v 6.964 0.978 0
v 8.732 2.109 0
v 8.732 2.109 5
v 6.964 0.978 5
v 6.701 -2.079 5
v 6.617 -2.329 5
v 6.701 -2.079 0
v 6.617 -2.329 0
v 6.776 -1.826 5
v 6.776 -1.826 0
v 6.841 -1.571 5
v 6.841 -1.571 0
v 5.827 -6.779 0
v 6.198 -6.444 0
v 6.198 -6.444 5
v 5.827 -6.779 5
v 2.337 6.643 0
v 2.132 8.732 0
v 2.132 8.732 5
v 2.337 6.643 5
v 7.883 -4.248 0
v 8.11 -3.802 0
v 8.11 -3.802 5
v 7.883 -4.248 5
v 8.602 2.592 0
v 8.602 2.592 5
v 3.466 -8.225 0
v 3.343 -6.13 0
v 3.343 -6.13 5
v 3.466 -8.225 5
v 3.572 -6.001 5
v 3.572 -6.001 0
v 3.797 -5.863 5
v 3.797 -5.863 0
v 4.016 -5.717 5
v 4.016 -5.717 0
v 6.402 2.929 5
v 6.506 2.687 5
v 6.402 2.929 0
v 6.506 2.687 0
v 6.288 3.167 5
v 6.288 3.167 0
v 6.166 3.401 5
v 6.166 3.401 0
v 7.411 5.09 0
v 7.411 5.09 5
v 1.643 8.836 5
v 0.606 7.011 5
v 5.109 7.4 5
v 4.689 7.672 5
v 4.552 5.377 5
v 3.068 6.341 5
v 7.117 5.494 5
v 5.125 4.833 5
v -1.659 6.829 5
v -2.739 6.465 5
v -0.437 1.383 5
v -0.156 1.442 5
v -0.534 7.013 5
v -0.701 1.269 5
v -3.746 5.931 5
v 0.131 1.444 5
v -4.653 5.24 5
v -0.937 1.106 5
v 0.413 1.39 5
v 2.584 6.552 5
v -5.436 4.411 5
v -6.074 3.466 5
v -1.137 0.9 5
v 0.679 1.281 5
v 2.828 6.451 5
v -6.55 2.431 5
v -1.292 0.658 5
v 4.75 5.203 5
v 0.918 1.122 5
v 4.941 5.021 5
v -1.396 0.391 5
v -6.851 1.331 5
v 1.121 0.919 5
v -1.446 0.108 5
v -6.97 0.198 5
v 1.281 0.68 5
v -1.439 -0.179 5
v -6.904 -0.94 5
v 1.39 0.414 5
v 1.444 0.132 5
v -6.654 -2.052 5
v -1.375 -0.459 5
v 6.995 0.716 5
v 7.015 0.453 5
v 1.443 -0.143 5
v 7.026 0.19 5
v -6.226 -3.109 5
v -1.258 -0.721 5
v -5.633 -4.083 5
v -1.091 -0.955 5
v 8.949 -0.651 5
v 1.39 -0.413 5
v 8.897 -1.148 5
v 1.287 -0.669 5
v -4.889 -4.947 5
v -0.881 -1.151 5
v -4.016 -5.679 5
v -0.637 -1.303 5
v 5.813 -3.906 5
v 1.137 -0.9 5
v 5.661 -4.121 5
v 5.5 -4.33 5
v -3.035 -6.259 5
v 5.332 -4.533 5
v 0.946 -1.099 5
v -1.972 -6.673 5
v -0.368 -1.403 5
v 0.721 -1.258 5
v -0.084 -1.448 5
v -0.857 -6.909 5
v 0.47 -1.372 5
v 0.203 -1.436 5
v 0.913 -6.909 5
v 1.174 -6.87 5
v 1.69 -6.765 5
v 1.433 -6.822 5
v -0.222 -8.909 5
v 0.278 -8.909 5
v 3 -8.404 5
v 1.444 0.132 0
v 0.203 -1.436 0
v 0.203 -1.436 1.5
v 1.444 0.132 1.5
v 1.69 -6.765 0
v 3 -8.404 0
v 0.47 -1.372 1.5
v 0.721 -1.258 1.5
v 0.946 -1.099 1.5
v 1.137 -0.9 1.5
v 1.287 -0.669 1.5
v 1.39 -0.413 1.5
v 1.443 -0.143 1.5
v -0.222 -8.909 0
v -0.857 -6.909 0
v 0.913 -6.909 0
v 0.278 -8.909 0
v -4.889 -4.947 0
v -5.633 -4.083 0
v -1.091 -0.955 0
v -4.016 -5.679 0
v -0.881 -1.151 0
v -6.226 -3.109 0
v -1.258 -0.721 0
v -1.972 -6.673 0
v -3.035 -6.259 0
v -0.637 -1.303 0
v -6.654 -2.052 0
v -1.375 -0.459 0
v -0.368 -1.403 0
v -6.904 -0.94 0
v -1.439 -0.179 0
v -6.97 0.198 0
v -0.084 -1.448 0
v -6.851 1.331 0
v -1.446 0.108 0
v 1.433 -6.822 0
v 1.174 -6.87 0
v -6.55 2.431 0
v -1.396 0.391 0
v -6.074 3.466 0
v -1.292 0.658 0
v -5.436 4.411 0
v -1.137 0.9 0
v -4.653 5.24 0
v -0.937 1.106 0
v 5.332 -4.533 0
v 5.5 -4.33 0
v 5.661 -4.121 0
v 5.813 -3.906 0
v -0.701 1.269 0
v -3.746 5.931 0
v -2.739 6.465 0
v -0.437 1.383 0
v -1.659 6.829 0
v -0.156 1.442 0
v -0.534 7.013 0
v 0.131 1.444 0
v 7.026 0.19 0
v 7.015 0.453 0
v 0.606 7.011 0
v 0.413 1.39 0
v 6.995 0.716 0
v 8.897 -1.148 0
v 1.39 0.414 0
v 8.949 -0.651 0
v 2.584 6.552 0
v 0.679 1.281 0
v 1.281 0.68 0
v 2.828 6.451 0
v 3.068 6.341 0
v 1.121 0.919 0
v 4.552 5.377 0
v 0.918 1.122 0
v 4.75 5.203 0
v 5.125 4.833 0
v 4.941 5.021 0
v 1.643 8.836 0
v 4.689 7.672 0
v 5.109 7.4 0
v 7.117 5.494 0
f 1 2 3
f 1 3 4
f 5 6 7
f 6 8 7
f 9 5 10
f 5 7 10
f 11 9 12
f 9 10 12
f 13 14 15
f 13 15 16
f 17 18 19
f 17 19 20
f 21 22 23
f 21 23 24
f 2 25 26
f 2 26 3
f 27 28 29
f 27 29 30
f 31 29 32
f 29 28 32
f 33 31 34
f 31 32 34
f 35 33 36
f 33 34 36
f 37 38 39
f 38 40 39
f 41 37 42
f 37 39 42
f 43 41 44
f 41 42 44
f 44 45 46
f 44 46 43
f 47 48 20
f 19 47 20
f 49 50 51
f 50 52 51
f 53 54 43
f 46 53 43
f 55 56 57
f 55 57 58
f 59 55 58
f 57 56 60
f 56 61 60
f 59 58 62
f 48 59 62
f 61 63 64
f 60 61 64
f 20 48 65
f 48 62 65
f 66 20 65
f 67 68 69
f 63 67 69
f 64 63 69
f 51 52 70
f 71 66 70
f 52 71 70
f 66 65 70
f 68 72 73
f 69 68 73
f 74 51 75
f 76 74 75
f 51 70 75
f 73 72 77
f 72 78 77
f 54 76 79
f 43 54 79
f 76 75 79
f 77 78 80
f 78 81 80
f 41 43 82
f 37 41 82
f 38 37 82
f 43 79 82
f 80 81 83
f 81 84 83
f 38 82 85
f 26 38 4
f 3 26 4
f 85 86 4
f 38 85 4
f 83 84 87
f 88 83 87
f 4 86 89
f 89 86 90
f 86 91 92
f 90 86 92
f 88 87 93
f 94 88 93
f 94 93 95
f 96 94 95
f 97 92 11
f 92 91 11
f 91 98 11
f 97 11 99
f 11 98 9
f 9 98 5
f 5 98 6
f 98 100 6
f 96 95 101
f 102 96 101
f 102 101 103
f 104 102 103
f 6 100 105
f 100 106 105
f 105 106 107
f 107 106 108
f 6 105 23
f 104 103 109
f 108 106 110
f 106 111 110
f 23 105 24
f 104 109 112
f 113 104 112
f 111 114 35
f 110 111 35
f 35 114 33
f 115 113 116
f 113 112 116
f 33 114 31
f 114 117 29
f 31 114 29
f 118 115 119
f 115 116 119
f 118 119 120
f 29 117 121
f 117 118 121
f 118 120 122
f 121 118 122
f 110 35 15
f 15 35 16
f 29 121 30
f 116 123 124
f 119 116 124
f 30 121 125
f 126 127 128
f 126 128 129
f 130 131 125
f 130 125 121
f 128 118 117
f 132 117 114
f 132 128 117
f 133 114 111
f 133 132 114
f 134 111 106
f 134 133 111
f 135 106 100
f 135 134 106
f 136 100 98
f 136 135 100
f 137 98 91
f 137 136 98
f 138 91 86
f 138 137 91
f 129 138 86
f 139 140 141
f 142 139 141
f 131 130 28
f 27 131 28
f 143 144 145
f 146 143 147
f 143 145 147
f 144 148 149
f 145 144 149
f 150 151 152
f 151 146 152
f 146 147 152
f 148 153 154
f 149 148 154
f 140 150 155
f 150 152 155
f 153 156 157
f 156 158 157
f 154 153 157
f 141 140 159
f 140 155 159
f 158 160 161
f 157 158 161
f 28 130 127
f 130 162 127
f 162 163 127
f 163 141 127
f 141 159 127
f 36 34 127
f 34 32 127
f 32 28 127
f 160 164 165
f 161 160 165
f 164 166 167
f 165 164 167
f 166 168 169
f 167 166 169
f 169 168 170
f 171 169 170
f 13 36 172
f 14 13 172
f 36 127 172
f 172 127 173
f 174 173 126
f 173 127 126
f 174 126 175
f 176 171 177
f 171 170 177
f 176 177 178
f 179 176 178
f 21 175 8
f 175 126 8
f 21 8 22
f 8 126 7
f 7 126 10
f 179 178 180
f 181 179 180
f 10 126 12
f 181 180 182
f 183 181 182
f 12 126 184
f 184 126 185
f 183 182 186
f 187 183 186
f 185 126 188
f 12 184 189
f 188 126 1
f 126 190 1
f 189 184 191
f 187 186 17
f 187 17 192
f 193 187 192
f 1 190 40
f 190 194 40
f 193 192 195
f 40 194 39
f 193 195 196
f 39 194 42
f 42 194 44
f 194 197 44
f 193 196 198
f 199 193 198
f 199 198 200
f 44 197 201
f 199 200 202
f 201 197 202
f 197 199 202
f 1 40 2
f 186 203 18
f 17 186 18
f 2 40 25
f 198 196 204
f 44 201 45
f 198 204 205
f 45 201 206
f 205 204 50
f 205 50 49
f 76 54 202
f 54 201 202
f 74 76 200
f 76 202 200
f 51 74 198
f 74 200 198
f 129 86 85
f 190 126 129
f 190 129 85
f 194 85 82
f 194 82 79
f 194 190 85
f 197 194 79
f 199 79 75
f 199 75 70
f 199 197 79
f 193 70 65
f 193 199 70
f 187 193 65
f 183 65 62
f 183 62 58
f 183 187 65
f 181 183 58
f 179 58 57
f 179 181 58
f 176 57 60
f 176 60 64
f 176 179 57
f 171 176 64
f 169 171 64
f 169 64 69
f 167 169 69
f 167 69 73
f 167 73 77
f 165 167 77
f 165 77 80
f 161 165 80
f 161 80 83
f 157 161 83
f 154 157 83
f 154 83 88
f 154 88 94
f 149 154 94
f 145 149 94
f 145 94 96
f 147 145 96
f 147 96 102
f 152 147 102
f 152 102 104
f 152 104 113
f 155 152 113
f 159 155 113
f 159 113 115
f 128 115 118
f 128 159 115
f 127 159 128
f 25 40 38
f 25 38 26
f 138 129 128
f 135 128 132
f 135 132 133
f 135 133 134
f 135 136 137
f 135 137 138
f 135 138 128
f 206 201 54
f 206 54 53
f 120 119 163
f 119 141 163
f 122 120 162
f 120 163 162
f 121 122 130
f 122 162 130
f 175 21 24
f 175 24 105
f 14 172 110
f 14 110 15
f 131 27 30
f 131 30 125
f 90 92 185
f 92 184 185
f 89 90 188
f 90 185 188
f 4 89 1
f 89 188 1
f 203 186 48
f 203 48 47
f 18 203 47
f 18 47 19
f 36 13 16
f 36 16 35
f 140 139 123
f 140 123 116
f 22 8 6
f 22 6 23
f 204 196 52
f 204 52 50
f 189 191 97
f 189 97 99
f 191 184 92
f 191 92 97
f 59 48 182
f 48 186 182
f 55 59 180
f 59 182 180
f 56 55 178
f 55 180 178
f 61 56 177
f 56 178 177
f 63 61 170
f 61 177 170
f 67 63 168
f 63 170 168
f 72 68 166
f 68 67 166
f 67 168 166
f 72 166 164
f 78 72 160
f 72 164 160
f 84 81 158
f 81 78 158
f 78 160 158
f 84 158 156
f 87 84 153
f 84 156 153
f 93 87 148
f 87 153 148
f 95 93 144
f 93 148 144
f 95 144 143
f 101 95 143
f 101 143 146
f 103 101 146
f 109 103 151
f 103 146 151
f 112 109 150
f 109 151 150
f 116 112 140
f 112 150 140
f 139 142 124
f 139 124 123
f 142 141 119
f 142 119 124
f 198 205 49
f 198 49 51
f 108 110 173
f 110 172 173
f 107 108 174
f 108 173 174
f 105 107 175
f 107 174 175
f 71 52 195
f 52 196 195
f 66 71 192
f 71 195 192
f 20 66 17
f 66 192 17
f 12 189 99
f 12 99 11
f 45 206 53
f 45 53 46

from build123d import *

# Parameters (mm, degrees)
SKETCH1_R           = 7
BOSS_EXTRUDE1_DEPTH = 5
BOSS_EXTRUDE2_DEPTH = 5
CIRPATTERN3_COUNT   = 9
CIRPATTERN3_ANGLE   = 168
CUT_EXTRUDE1_START  = -3.5
SKETCH5_R           = 1.45
CUT_EXTRUDE1_DEPTH  = 3.5


with BuildPart() as part:
    # Sketch1 → Boss-Extrude1 (new body)
    with BuildSketch(Plane.XY):
        with Locations((0.027853283, 0.035186328)):
            Circle(SKETCH1_R)
        with BuildLine():
            Line((0.20260938, -1.435774857), (1.443945142, 0.132372307))
            ThreePointArc((1.443945142, 0.132372307), (-1.136906694, 0.899968427), (0.20260938, -1.435774857))
        make_face(mode=Mode.SUBTRACT)
    extrude(amount=BOSS_EXTRUDE1_DEPTH)

    # Sketch3 → Boss-Extrude2 (add)
    with BuildSketch(Plane(origin=(0, 0, 0), x_dir=(-1, 0, 0), z_dir=(0, 0, -1))):
        Polygon((0.857146717, -6.908643667), (-0.912853283, -6.908643667), (-0.277853283, -8.908643667), (0.222146717, -8.908643667), align=None)
    boss_extrude2 = extrude(amount=-BOSS_EXTRUDE2_DEPTH)

    # CirPattern3: Boss-Extrude2 ×9 about axis
    cirpattern3_axis = Axis((0.027853283, 0.035186328, 0), (0, 0, 1))
    for i in range(1, CIRPATTERN3_COUNT):
        add(boss_extrude2.rotate(cirpattern3_axis, i * CIRPATTERN3_ANGLE / (CIRPATTERN3_COUNT - 1)))

    # Sketch5 → Cut-Extrude1 (cut)
    with BuildSketch(Plane.XY.offset(5).offset(CUT_EXTRUDE1_START)):
        with Locations(Location((0, 0, 0), (0, 0, 278.032257946))):
            Circle(SKETCH5_R)
    extrude(amount=CUT_EXTRUDE1_DEPTH, mode=Mode.SUBTRACT)


solid = part.part
